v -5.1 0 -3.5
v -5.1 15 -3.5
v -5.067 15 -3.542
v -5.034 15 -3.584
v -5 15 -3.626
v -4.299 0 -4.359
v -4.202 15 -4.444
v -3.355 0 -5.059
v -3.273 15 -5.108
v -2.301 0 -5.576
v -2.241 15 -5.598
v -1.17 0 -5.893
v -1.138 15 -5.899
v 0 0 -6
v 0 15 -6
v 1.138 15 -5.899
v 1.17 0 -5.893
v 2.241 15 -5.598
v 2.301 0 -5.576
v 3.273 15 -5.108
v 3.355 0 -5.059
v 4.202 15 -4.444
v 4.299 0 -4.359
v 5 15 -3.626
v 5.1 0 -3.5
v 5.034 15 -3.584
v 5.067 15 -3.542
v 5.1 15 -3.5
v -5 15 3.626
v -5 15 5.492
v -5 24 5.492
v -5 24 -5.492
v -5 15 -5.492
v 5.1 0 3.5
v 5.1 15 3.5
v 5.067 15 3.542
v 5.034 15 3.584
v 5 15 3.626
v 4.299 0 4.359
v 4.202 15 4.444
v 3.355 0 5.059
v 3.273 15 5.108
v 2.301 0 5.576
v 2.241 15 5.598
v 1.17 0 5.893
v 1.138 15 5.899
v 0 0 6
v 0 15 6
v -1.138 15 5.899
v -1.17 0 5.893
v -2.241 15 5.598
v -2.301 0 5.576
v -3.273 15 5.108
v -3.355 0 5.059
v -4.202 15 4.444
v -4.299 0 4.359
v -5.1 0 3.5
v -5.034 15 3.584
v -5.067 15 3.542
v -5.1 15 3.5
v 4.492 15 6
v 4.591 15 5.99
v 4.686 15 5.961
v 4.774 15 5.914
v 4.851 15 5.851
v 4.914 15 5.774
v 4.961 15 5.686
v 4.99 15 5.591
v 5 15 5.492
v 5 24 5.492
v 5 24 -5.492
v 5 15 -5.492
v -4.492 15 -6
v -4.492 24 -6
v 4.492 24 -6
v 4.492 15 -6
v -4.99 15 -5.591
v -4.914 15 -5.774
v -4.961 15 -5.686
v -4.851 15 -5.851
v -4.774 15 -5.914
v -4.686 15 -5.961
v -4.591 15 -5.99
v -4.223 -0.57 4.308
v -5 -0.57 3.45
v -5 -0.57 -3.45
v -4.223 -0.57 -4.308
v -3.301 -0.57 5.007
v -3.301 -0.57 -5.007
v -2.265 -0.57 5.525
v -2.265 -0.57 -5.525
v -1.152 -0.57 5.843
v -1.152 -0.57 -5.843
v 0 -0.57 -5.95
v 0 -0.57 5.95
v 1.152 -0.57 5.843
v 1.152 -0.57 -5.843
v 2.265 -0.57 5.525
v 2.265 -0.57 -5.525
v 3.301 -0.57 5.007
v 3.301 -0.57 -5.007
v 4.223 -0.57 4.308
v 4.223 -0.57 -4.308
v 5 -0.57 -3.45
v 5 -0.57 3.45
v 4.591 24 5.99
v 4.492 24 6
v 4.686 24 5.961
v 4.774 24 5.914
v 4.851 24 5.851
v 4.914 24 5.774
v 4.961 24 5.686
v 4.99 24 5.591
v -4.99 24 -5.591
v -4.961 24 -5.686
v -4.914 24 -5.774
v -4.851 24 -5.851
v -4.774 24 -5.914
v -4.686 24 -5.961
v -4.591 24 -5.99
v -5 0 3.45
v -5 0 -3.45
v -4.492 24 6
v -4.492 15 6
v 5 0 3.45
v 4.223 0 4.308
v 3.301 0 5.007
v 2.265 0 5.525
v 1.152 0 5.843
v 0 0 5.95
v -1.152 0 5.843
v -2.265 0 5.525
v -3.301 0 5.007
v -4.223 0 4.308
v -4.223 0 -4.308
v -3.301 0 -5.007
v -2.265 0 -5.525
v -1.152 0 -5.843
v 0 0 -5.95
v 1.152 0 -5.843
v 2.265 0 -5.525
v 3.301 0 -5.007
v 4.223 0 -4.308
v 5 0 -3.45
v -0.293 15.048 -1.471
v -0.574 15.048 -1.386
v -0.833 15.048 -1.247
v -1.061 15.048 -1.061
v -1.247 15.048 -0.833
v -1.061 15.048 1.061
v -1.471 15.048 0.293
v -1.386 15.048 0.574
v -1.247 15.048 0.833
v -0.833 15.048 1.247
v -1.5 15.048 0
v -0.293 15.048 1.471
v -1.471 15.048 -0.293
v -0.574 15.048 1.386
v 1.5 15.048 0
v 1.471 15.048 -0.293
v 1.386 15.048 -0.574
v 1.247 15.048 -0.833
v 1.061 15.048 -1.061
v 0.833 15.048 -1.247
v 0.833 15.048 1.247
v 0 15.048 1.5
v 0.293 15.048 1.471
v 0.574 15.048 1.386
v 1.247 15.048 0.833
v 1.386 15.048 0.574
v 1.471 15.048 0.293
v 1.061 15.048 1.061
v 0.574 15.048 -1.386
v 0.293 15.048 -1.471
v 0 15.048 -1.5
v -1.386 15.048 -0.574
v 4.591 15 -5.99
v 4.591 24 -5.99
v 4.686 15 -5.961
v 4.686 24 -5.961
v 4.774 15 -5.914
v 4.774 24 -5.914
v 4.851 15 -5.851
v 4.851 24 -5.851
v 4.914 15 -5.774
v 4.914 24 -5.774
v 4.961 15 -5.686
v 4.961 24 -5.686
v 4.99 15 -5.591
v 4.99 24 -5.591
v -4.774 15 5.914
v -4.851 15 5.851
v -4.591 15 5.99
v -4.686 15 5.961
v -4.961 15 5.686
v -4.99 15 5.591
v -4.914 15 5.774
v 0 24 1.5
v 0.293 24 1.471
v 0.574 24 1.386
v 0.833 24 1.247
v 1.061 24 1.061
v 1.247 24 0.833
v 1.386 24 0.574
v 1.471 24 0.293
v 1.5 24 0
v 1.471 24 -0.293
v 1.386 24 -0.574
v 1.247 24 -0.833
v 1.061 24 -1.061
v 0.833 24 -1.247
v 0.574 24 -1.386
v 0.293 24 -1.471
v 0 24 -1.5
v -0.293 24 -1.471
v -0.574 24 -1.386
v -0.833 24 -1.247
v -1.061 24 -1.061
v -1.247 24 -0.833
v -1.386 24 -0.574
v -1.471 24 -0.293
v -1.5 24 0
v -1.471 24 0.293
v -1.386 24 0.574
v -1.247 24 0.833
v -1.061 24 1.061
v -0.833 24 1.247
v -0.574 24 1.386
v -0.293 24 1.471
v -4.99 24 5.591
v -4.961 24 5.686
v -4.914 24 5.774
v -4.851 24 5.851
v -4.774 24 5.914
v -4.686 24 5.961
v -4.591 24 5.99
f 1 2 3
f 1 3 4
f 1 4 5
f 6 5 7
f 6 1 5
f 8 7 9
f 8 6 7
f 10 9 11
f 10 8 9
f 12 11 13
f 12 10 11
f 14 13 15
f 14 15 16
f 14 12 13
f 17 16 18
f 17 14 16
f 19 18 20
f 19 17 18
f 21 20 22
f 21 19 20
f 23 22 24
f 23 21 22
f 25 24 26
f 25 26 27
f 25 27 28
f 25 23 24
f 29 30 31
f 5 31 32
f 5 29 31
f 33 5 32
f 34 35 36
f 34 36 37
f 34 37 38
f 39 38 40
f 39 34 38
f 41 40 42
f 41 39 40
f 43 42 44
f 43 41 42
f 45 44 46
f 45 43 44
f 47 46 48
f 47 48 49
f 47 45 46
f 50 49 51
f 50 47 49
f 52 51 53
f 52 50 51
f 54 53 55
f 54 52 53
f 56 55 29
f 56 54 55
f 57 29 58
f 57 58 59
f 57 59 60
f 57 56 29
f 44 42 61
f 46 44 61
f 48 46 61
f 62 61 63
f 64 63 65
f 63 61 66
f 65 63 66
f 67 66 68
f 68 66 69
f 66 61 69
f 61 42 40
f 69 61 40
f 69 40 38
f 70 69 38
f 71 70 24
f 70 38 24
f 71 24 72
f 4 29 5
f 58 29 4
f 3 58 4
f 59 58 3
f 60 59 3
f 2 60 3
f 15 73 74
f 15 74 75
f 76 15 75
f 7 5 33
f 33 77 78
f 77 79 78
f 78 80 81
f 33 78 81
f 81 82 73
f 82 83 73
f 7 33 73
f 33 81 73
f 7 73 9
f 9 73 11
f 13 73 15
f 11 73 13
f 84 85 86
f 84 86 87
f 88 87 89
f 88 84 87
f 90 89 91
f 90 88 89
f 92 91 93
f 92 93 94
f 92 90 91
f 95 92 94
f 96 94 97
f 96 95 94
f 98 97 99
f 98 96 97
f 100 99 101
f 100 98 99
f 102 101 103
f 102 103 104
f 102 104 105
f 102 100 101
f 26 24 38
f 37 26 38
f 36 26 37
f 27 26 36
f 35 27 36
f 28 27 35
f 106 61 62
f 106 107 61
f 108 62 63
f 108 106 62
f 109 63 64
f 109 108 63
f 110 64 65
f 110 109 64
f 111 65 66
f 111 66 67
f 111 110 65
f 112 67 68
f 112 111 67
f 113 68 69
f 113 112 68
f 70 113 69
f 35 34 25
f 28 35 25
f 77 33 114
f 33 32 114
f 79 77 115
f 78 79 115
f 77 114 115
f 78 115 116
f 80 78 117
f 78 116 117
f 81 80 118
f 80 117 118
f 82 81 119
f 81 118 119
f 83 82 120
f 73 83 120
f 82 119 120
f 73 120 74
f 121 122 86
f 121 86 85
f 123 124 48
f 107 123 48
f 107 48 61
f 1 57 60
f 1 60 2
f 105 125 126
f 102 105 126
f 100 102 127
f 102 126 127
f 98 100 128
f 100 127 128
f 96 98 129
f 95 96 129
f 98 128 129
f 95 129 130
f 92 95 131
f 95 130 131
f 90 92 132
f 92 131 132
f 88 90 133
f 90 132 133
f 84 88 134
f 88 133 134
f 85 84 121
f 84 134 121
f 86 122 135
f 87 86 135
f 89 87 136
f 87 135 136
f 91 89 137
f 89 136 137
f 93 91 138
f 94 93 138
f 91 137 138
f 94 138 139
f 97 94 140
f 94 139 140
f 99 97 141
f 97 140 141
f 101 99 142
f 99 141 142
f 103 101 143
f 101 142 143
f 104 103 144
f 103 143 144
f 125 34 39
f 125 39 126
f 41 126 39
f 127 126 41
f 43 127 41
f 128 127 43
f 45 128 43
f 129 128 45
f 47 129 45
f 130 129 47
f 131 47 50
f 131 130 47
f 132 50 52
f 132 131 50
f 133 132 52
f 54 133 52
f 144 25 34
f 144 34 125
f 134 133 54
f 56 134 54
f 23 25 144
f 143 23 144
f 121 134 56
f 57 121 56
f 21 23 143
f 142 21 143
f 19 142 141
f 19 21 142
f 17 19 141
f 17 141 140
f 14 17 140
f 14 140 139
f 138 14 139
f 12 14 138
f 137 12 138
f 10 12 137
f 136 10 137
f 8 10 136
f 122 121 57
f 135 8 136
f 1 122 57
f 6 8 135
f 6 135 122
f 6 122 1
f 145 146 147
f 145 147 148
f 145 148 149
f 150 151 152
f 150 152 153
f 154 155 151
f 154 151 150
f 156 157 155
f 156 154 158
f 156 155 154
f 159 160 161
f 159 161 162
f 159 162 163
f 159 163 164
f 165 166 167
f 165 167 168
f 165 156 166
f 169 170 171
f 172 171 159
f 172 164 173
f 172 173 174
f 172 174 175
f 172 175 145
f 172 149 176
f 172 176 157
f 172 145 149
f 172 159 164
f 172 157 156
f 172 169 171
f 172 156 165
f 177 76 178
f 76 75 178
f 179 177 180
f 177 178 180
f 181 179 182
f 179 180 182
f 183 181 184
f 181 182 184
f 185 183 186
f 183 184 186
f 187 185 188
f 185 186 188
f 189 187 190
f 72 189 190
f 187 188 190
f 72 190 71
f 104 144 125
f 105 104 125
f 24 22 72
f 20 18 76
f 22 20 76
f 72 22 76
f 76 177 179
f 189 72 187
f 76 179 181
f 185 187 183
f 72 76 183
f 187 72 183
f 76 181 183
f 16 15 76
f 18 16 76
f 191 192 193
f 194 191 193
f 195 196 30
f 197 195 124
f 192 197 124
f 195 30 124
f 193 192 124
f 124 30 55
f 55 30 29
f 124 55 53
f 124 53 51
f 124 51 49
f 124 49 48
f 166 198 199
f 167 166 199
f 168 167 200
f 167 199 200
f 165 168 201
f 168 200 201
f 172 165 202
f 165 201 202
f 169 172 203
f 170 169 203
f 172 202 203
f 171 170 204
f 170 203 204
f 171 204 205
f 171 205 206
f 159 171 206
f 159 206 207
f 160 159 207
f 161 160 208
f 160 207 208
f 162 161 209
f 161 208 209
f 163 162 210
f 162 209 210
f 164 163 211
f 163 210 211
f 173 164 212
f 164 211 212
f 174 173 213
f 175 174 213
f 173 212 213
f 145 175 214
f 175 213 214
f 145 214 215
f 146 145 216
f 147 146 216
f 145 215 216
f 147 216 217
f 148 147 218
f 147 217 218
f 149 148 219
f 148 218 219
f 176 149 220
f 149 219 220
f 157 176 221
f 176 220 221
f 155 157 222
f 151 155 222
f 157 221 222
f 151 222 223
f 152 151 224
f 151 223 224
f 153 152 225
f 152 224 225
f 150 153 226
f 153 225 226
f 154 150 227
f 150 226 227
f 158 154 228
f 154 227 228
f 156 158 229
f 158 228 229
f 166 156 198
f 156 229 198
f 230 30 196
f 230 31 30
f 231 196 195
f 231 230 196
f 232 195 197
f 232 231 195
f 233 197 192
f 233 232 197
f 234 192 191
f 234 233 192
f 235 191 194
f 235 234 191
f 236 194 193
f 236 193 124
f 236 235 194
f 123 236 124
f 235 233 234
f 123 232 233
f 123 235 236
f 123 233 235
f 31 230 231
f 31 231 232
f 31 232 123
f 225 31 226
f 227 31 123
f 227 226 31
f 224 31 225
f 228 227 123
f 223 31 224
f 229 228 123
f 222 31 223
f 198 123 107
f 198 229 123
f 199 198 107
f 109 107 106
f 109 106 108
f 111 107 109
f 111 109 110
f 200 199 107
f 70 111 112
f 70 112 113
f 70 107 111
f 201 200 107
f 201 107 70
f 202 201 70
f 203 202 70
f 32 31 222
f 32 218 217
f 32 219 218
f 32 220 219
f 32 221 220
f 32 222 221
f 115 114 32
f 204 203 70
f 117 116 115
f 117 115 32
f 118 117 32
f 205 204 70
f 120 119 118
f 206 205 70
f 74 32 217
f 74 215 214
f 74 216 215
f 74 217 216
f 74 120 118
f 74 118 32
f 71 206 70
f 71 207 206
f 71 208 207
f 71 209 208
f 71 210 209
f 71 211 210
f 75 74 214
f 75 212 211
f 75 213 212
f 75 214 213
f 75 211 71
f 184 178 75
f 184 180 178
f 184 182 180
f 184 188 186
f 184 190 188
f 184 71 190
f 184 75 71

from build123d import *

# Parameters (mm, degrees)
SKETCH1_W           = 10.2
SKETCH1_H           = 7
BOSS_EXTRUDE1_DEPTH = 15
SKETCH2_W           = 10
SKETCH2_H           = 12
BOSS_EXTRUDE2_DEPTH = 9
FILLET1_R           = 0.508
SKETCH3_W           = 10
SKETCH3_H           = 6.9
BOSS_EXTRUDE3_DEPTH = 0.57
SKETCH4_R           = 1.5
CUT_EXTRUDE1_DEPTH  = 8.952


with BuildPart() as part:
    # Sketch1 → Boss-Extrude1 (new body)
    with BuildSketch(Plane(origin=(0, 0, 0), x_dir=(1, 0, 0), z_dir=(0, 1, 0))):
        with BuildLine():
            Line((-5.1, -3.5), (5.1, -3.5))
            ThreePointArc((5.1, -3.5), (0, -6), (-5.1, -3.5))
        make_face()
        Rectangle(SKETCH1_W, SKETCH1_H)
        with BuildLine():
            ThreePointArc((-5.1, 3.5), (0, 6), (5.1, 3.5))
            Line((5.1, 3.5), (-5.1, 3.5))
        make_face()
    extrude(amount=BOSS_EXTRUDE1_DEPTH)

    # Sketch2 → Boss-Extrude2 (add)
    with BuildSketch(Plane(origin=(0, 15, 0), x_dir=(1, 0, 0), z_dir=(0, 1, 0))):
        Rectangle(SKETCH2_W, SKETCH2_H)
    extrude(amount=BOSS_EXTRUDE2_DEPTH)

    # Fillet1
    fillet1_edges = [part.edges().sort_by_distance(p)[0] for p in [
        (5, 19.5, 6),
        (5, 19.5, -6),
        (-5, 19.5, -6),
        (-5, 19.5, 6),
    ]]
    fillet(fillet1_edges, radius=FILLET1_R)

    # Sketch3 → Boss-Extrude3 (add)
    with BuildSketch(Plane.XZ):
        Rectangle(SKETCH3_W, SKETCH3_H)
        with BuildLine():
            Line((5, -3.45), (-5, -3.45))
            ThreePointArc((-5, -3.45), (0, -5.95), (5, -3.45))
        make_face()
        with BuildLine():
            ThreePointArc((5, 3.45), (0, 5.95), (-5, 3.45))
            Line((-5, 3.45), (5, 3.45))
        make_face()
    extrude(amount=BOSS_EXTRUDE3_DEPTH)

    # Sketch4 → Cut-Extrude1 (cut)
    with BuildSketch(Plane(origin=(0, 24, 0), x_dir=(1, 0, 0), z_dir=(0, 1, 0))):
        with Locations(Location((0, 0, 0), (0, 0, 270))):
            Circle(SKETCH4_R)
    extrude(amount=-CUT_EXTRUDE1_DEPTH, mode=Mode.SUBTRACT)


solid = part.part
